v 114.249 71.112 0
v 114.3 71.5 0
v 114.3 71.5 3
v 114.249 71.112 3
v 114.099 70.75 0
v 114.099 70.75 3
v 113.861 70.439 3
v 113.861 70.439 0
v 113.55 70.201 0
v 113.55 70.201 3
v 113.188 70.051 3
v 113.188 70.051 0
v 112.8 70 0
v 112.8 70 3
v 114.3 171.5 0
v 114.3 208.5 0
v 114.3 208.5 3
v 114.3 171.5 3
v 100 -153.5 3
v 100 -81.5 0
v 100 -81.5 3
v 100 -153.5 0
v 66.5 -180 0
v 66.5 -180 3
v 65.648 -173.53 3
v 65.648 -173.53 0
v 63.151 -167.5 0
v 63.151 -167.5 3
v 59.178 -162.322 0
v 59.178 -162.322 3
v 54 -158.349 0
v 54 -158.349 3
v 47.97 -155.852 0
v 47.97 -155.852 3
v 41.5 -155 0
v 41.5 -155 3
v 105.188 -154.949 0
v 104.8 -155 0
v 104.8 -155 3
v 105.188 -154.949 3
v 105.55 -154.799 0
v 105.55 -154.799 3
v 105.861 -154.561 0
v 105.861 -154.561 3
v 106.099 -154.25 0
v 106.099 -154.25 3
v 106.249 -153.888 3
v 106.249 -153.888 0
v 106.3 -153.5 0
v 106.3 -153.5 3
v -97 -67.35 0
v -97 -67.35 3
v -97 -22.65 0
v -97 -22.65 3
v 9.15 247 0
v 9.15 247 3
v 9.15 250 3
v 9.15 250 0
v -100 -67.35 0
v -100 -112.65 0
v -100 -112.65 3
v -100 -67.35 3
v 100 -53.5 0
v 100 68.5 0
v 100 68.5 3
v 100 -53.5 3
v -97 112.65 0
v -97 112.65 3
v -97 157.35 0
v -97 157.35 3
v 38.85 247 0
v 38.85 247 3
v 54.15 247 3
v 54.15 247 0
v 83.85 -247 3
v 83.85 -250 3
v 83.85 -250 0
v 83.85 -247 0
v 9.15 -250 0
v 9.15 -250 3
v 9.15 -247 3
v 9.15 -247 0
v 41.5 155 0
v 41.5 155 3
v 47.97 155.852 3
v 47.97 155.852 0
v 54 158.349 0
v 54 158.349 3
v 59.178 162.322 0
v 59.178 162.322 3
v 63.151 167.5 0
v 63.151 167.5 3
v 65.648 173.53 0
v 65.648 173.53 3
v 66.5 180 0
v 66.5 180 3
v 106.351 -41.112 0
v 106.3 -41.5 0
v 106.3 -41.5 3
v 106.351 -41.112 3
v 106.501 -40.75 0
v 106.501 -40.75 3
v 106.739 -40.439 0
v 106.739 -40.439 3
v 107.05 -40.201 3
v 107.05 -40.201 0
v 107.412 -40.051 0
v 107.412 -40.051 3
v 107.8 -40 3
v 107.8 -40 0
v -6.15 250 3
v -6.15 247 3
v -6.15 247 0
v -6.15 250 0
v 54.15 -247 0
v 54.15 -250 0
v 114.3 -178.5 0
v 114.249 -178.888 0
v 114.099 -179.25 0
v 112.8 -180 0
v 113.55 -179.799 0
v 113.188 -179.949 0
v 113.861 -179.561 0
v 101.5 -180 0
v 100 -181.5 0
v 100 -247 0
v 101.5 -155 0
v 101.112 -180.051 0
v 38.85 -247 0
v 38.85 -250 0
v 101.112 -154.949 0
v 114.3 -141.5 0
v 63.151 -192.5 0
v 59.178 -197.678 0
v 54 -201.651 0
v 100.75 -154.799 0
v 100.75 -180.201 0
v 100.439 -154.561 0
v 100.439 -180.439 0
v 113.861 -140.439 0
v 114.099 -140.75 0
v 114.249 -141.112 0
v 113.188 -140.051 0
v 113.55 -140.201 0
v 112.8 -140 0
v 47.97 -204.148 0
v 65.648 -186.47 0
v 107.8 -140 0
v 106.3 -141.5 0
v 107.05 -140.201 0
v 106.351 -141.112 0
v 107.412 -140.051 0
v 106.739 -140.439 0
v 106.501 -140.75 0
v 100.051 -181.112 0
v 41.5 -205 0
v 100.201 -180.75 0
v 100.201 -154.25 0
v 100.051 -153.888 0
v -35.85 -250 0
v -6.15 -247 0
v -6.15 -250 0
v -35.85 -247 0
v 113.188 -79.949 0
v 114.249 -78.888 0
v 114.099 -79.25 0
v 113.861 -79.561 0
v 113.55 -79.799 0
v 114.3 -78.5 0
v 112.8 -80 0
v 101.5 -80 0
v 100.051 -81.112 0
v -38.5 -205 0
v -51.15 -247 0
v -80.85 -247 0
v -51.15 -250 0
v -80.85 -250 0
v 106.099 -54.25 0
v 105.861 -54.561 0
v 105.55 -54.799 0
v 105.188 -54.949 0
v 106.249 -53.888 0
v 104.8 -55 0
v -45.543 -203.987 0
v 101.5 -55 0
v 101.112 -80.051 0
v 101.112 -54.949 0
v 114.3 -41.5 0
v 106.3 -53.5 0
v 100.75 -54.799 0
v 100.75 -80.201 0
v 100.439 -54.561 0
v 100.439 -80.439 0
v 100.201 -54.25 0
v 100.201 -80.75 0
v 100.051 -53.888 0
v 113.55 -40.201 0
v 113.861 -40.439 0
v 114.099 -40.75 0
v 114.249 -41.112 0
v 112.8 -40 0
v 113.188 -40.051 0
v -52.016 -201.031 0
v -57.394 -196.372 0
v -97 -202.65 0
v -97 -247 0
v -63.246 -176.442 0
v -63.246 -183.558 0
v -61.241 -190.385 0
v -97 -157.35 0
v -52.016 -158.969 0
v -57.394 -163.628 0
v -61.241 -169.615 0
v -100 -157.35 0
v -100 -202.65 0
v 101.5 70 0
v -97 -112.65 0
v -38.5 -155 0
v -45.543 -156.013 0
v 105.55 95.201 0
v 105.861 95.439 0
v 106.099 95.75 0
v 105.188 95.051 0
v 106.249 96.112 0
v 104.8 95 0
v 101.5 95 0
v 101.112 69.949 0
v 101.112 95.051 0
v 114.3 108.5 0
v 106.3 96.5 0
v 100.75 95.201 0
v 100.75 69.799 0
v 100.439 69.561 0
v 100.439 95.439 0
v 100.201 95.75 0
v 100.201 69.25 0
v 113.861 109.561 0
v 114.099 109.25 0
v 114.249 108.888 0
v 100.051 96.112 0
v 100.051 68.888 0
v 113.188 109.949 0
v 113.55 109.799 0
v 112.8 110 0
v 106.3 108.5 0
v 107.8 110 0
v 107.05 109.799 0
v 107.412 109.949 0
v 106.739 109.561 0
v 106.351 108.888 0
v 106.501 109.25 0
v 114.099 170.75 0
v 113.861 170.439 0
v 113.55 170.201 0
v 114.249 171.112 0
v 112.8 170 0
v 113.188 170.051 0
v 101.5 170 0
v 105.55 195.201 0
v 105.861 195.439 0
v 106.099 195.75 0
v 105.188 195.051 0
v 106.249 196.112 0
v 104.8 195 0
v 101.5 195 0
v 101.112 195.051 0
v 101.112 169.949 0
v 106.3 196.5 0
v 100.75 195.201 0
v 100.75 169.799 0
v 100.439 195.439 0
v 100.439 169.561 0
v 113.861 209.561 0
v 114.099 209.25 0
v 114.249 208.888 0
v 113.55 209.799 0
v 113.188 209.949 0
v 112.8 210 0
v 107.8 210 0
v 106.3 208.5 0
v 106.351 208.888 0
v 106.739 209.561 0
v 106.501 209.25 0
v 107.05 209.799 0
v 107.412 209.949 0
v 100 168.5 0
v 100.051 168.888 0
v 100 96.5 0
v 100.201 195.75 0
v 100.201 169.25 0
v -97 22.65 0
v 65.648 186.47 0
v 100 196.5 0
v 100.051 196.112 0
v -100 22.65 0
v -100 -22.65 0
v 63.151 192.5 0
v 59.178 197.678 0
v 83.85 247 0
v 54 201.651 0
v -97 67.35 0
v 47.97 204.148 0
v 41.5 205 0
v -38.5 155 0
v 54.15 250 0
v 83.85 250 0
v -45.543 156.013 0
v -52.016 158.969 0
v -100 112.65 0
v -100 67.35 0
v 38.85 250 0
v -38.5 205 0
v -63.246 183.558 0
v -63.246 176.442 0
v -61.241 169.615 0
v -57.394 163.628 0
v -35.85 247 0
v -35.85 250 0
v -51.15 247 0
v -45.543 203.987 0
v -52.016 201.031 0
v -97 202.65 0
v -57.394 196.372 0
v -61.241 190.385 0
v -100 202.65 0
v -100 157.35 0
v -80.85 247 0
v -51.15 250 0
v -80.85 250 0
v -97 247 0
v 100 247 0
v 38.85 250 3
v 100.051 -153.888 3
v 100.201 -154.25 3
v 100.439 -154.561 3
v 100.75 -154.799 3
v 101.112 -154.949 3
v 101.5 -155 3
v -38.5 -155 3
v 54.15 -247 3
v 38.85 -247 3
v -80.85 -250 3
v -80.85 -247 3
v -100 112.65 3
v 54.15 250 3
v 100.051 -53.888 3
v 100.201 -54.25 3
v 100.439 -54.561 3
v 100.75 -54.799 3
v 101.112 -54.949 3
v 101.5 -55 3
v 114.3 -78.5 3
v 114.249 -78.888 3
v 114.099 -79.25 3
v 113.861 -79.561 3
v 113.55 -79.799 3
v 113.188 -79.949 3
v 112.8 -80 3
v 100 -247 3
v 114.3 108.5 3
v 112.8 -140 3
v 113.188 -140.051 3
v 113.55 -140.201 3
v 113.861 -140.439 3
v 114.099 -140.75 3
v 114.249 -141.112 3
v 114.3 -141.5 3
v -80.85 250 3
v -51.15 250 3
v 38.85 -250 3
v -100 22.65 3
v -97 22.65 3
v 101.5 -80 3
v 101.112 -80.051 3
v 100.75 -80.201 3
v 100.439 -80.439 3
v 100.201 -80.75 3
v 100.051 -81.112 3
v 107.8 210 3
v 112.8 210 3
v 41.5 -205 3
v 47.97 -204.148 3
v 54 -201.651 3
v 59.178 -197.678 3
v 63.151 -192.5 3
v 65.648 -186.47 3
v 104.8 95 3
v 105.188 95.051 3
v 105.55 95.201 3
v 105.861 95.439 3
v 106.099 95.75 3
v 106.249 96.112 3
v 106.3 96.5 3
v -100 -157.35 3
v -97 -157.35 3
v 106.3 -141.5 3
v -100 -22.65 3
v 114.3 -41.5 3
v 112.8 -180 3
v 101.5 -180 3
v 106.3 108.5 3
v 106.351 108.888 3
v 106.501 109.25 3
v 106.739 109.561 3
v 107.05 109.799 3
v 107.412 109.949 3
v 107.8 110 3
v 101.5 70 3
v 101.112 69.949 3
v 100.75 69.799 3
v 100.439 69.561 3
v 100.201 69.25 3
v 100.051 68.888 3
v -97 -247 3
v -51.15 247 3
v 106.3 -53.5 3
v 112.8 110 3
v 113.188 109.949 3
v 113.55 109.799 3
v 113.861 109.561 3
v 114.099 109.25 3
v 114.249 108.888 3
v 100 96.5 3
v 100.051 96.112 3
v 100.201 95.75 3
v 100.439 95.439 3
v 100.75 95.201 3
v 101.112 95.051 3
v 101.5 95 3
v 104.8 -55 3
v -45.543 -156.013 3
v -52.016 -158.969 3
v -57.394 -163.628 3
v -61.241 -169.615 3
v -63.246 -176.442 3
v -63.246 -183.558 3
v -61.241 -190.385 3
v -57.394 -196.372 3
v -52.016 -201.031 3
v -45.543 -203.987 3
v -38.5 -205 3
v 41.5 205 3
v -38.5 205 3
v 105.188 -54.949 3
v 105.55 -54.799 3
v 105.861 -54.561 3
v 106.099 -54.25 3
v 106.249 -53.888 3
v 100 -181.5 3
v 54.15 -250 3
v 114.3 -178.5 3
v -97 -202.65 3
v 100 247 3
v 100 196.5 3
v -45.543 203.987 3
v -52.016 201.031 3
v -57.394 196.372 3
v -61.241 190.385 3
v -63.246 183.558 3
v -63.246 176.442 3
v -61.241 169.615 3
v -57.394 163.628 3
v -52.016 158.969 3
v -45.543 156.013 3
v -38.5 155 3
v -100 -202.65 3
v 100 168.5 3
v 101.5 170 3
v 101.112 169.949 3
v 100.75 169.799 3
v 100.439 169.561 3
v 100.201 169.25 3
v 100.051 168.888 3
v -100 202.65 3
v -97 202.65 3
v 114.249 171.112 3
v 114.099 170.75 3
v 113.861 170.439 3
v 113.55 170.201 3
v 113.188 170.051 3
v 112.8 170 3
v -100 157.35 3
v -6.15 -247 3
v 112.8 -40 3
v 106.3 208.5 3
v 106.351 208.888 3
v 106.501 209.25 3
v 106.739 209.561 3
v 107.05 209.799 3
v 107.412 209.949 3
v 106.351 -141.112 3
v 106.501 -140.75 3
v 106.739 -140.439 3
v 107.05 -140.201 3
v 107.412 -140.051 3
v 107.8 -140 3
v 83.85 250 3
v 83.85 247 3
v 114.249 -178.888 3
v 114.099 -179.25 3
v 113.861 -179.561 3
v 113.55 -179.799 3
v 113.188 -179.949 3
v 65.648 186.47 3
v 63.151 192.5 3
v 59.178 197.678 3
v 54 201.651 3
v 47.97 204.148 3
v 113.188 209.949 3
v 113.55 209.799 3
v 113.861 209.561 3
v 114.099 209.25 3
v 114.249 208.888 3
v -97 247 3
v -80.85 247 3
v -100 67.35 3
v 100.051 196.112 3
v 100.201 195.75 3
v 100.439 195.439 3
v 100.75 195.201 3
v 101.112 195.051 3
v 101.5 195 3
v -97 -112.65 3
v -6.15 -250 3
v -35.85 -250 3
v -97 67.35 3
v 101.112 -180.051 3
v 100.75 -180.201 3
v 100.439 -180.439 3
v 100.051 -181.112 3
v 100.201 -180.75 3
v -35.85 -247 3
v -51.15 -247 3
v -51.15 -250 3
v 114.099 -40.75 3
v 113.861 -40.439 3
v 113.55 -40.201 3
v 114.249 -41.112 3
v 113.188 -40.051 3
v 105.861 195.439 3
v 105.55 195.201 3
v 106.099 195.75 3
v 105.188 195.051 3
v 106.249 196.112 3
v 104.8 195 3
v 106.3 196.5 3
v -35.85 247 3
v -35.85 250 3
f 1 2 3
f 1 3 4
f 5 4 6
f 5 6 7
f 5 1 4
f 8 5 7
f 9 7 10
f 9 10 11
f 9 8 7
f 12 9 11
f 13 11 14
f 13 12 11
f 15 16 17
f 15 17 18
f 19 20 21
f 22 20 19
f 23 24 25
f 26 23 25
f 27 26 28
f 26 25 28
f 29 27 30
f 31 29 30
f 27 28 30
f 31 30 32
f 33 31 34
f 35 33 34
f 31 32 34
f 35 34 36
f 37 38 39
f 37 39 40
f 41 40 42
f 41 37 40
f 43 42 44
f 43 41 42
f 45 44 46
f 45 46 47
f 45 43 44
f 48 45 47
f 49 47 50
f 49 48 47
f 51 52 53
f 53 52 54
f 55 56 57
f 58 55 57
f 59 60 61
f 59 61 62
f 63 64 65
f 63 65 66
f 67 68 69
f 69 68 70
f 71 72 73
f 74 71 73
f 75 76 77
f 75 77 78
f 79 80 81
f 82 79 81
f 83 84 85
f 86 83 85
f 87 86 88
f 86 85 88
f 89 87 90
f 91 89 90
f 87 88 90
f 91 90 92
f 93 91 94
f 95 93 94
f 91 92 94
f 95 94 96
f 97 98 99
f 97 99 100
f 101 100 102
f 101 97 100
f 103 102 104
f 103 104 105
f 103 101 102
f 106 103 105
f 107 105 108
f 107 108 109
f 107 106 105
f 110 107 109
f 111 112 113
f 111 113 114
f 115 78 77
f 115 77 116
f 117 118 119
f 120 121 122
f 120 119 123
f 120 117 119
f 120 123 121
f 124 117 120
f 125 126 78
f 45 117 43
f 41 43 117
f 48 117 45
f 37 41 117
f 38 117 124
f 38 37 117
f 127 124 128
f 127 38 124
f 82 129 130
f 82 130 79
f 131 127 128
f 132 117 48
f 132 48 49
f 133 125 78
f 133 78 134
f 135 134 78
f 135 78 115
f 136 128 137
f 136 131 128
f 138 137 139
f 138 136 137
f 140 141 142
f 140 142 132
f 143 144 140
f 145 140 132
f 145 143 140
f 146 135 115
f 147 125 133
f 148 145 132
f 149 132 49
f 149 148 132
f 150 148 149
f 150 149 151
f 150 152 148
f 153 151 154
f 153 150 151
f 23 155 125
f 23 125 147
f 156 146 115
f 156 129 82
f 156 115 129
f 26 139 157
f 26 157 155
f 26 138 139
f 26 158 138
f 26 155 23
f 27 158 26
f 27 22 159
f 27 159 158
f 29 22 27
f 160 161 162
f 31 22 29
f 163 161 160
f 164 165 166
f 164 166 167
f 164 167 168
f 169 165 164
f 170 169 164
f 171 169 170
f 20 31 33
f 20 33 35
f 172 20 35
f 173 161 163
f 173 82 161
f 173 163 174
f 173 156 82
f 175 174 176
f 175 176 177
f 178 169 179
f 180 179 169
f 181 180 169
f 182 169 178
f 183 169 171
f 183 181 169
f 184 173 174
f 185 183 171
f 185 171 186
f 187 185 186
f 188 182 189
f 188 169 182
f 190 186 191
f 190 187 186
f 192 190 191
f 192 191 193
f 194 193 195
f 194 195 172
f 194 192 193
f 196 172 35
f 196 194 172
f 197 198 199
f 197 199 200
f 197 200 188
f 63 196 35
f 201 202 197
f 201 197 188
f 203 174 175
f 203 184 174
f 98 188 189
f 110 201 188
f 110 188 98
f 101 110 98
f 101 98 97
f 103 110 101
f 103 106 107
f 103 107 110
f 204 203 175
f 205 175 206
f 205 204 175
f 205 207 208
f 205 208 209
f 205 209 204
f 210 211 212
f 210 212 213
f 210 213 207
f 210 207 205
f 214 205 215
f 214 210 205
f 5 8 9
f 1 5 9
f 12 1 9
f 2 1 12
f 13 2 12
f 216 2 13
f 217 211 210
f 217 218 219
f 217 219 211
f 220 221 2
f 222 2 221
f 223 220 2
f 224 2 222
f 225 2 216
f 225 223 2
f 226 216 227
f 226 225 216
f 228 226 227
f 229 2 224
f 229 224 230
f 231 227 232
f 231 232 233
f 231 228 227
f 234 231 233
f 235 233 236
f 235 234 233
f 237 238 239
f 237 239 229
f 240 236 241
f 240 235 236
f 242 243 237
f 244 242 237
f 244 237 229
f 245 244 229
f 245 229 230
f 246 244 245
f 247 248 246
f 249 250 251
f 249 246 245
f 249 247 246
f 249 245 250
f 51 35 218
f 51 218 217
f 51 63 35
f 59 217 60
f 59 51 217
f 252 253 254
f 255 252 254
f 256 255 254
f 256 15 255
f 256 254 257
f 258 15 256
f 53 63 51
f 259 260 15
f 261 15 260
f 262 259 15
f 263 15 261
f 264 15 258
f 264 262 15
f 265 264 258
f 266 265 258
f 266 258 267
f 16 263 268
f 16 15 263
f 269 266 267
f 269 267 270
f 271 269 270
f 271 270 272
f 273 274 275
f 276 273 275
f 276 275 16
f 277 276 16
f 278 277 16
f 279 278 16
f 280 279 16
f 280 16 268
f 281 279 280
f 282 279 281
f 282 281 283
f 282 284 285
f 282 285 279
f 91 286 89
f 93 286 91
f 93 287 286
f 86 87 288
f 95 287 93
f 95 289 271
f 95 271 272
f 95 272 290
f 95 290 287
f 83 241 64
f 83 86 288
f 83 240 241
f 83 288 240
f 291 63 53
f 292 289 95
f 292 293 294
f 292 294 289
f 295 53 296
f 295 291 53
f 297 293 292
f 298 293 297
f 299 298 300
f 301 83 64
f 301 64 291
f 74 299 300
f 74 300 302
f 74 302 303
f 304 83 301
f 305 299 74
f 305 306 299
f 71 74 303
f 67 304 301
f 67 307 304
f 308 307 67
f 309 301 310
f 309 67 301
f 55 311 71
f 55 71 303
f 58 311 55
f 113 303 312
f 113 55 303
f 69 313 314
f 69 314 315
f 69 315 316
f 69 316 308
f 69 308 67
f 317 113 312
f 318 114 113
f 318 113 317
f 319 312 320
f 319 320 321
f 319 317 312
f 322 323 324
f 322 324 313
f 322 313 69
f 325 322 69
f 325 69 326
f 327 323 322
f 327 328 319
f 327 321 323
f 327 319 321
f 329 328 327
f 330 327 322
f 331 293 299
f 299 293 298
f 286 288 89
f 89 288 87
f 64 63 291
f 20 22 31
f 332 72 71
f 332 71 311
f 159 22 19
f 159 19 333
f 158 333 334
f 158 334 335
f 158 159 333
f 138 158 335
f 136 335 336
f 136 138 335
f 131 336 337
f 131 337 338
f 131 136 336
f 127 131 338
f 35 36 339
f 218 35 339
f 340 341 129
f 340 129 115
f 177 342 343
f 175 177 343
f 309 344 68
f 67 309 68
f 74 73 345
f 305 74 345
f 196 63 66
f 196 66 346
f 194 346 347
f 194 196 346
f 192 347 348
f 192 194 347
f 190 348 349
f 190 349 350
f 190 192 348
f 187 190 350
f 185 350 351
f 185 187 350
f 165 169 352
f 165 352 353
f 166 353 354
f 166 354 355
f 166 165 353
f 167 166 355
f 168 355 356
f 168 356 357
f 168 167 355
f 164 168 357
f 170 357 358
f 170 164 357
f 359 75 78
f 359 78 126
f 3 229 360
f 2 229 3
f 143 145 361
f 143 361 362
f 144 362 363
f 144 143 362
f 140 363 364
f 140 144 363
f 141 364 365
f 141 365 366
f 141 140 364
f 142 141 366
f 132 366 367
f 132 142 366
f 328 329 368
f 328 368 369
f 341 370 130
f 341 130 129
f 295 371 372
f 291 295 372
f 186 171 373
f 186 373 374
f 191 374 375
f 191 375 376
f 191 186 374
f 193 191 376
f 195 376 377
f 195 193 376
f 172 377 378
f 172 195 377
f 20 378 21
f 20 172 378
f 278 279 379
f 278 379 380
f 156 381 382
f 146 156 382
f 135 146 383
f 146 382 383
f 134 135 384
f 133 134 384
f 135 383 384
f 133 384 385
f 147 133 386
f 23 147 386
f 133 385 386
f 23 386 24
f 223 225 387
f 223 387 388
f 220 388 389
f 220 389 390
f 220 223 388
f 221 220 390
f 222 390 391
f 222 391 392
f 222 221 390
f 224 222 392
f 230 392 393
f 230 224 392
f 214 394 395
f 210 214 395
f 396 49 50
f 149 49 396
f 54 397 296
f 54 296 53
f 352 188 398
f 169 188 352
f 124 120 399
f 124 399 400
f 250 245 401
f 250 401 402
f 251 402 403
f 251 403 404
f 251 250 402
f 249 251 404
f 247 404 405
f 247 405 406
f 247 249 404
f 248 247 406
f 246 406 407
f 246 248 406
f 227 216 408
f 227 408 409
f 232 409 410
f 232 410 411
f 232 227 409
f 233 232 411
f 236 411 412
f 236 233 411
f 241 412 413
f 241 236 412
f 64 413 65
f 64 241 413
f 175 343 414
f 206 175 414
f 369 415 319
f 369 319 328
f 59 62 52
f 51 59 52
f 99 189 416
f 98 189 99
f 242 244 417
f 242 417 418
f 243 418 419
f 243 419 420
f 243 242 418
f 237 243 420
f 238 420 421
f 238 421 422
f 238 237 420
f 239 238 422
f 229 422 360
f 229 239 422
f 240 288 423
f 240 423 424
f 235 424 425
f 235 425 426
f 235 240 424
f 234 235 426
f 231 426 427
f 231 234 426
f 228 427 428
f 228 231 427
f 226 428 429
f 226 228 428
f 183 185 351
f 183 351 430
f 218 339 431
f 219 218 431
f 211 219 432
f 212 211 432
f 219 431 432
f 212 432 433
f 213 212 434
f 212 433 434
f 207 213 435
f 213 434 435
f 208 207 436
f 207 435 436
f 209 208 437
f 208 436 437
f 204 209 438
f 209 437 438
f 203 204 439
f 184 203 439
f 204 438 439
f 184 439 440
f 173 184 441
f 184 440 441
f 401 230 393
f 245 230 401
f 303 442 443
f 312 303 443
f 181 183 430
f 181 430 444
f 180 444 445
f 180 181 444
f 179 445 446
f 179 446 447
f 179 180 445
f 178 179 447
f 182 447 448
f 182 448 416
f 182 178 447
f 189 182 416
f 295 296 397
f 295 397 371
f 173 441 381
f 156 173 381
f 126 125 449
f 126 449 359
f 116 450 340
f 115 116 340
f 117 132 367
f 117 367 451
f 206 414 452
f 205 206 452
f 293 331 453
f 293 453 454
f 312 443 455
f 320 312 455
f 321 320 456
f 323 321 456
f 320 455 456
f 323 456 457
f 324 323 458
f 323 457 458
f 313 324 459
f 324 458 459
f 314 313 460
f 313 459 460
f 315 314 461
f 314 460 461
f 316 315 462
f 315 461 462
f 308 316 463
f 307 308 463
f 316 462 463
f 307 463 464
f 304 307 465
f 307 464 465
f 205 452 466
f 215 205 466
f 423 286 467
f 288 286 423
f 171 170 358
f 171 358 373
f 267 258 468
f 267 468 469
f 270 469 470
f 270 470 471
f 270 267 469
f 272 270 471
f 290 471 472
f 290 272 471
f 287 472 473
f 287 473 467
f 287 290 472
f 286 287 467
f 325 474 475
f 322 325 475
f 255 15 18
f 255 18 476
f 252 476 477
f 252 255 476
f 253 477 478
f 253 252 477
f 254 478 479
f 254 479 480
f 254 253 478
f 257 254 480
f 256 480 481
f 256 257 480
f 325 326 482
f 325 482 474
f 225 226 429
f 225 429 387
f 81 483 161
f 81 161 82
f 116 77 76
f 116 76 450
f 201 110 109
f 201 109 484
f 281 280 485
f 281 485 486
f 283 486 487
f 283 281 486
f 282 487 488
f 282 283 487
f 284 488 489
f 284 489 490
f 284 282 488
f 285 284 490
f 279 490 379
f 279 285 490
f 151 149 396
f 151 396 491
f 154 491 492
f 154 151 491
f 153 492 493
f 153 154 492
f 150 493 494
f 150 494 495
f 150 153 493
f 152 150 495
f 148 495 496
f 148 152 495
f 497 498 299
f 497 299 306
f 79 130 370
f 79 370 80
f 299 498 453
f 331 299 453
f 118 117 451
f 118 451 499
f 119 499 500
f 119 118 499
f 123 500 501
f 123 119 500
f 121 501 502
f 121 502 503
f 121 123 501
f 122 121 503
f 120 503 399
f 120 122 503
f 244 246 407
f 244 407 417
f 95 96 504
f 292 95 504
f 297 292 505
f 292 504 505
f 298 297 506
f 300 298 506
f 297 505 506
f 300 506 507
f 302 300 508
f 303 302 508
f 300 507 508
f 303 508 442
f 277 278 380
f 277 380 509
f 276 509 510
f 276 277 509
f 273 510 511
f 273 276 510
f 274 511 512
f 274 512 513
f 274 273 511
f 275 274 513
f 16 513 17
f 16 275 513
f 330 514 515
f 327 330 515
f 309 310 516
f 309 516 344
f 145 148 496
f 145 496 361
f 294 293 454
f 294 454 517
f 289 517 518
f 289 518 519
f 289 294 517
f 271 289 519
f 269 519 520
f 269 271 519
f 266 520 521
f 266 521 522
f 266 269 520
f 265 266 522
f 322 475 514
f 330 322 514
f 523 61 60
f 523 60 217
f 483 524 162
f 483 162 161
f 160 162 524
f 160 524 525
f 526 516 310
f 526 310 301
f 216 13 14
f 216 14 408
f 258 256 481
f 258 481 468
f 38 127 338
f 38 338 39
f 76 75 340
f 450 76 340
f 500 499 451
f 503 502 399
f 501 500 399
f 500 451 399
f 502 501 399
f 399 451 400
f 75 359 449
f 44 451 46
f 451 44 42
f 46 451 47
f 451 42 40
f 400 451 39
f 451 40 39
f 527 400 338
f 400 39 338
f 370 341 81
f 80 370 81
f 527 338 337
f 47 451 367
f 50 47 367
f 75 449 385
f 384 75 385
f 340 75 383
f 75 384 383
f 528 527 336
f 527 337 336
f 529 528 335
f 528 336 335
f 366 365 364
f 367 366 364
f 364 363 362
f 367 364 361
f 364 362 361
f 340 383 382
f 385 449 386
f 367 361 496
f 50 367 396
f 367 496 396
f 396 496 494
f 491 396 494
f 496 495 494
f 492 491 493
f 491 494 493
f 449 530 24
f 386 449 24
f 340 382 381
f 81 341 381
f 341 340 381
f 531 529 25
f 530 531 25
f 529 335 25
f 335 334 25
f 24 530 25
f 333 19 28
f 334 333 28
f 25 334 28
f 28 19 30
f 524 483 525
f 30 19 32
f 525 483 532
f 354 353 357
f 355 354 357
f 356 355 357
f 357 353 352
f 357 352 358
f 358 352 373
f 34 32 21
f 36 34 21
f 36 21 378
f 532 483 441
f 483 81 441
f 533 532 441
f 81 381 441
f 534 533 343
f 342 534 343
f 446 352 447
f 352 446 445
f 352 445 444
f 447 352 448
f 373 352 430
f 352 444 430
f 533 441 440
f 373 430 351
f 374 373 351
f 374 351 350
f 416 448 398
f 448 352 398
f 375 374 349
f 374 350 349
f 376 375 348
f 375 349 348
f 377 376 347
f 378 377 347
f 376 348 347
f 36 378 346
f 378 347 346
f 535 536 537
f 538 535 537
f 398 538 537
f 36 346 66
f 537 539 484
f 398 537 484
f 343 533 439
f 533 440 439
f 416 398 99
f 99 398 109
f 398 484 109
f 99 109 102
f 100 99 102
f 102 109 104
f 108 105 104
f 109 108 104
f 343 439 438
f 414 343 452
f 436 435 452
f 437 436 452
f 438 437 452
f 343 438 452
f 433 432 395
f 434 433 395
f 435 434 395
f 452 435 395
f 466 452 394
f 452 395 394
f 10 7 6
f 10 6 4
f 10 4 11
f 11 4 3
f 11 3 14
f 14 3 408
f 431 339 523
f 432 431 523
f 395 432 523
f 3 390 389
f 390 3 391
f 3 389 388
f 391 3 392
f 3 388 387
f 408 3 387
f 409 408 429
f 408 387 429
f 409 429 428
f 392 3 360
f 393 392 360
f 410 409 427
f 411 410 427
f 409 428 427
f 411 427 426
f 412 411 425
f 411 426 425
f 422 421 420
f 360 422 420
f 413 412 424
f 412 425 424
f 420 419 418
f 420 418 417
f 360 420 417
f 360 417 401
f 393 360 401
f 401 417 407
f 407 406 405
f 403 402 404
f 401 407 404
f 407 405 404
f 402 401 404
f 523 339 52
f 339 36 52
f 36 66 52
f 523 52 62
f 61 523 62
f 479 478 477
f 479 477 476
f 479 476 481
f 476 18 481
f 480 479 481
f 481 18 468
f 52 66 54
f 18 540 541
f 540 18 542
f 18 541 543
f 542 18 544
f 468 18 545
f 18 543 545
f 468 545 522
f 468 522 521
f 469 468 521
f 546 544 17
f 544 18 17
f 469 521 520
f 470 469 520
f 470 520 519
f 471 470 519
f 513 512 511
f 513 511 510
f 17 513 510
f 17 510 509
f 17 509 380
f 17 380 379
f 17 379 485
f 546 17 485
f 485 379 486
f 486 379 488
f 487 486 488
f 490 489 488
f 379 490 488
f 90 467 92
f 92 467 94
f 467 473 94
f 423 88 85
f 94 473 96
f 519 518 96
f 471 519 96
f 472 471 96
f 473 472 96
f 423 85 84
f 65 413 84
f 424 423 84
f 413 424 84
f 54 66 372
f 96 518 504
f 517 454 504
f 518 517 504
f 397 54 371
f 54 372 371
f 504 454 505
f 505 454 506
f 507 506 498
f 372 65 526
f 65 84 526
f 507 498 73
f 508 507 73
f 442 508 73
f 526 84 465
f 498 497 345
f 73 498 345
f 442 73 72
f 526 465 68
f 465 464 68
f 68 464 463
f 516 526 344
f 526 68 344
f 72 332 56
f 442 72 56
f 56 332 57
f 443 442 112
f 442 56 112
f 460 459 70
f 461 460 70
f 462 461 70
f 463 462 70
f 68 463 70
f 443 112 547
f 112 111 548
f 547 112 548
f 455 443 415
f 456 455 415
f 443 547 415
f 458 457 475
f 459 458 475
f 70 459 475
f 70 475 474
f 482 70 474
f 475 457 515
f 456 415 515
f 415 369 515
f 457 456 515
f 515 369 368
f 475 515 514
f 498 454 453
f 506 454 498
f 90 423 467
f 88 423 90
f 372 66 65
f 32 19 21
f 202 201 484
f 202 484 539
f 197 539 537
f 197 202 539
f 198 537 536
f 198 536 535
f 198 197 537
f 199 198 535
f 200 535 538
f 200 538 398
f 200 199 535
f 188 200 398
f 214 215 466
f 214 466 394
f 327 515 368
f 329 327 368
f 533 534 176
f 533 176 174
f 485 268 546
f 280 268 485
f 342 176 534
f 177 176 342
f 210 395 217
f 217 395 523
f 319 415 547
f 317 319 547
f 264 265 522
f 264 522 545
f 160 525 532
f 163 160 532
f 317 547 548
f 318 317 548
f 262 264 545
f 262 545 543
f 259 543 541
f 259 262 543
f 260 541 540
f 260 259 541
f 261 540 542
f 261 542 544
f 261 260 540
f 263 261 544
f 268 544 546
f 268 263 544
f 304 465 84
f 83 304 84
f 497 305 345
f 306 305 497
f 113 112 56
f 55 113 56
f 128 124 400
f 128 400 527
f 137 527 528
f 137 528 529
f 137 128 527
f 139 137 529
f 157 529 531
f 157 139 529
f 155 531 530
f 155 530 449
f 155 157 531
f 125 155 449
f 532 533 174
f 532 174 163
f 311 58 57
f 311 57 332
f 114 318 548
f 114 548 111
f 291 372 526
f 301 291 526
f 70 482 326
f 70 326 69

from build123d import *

# Parameters (mm, degrees)
SALIENTE_EXTRUIR1_DEPTH = 3
CORTAR_EXTRUIR1_REACH   = 5
CROQUIS2_W              = 15.3
CROQUIS2_H              = 3
CROQUIS2_W_2            = 16.15
CROQUIS2_W_3            = 3
CROQUIS2_H_2            = 44.7


with BuildPart() as part:
    # Croquis1 → Saliente-Extruir1 (new body)
    with BuildSketch(Plane.XY):
        with BuildLine():
            Line((101.5, 195), (104.8, 195))
            ThreePointArc((104.8, 195), (105.860660172, 195.439339828), (106.3, 196.5))
            Line((106.3, 196.5), (106.3, 208.5))
            ThreePointArc((106.3, 208.5), (106.739339828, 209.560660172), (107.8, 210))
            Line((107.8, 210), (112.8, 210))
            ThreePointArc((112.8, 210), (113.860660172, 209.560660172), (114.3, 208.5))
            Line((114.3, 208.5), (114.3, 171.5))
            ThreePointArc((114.3, 171.5), (113.860660172, 170.439339828), (112.8, 170))
            Line((112.8, 170), (101.5, 170))
            ThreePointArc((101.5, 170), (100.439339828, 169.560660172), (100, 168.5))
            Line((100, 168.5), (100, 96.5))
            ThreePointArc((100, 96.5), (100.439339828, 95.439339828), (101.5, 95))
            Line((101.5, 95), (104.8, 95))
            ThreePointArc((104.8, 95), (105.860660172, 95.439339828), (106.3, 96.5))
            Line((106.3, 96.5), (106.3, 108.5))
            ThreePointArc((106.3, 108.5), (106.739339828, 109.560660172), (107.8, 110))
            Line((107.8, 110), (112.8, 110))
            ThreePointArc((112.8, 110), (113.860660172, 109.560660172), (114.3, 108.5))
            Line((114.3, 108.5), (114.3, 71.5))
            ThreePointArc((114.3, 71.5), (113.860660172, 70.439339828), (112.8, 70))
            Line((112.8, 70), (101.5, 70))
            ThreePointArc((101.5, 70), (100.439339828, 69.560660172), (100, 68.5))
            Line((100, 68.5), (100, -53.5))
            ThreePointArc((100, -53.5), (100.439339828, -54.560660172), (101.5, -55))
            Line((101.5, -55), (104.8, -55))
            ThreePointArc((104.8, -55), (105.860660172, -54.560660172), (106.3, -53.5))
            Line((106.3, -53.5), (106.3, -41.5))
            ThreePointArc((106.3, -41.5), (106.739339828, -40.439339828), (107.8, -40))
            Line((107.8, -40), (112.8, -40))
            ThreePointArc((112.8, -40), (113.860660172, -40.439339828), (114.3, -41.5))
            Line((114.3, -41.5), (114.3, -78.5))
            ThreePointArc((114.3, -78.5), (113.860660172, -79.560660172), (112.8, -80))
            Line((112.8, -80), (101.5, -80))
            ThreePointArc((101.5, -80), (100.439339828, -80.439339828), (100, -81.5))
            Line((100, -81.5), (100, -153.5))
            ThreePointArc((100, -153.5), (100.439339828, -154.560660172), (101.5, -155))
            Line((101.5, -155), (104.8, -155))
            ThreePointArc((104.8, -155), (105.860660172, -154.560660172), (106.3, -153.5))
            Line((106.3, -153.5), (106.3, -141.5))
            ThreePointArc((106.3, -141.5), (106.739339828, -140.439339828), (107.8, -140))
            Line((107.8, -140), (112.8, -140))
            ThreePointArc((112.8, -140), (113.860660172, -140.439339828), (114.3, -141.5))
            Line((114.3, -141.5), (114.3, -178.5))
            ThreePointArc((114.3, -178.5), (113.860660172, -179.560660172), (112.8, -180))
            Line((112.8, -180), (101.5, -180))
            ThreePointArc((101.5, -180), (100.439339828, -180.439339828), (100, -181.5))
            Line((100, -181.5), (100, -250))
            Line((100, -250), (-100, -250))
            Line((-100, -250), (-100, 250))
            Line((-100, 250), (100, 250))
            Line((100, 250), (100, 196.5))
            ThreePointArc((100, 196.5), (100.439339828, 195.439339828), (101.5, 195))
        make_face()
    extrude(amount=SALIENTE_EXTRUIR1_DEPTH)

    # Croquis2 → Cortar-Extruir1 (cut, up to next)
    with BuildSketch(Plane.XY.offset(3), mode=Mode.PRIVATE) as cortar_extruir1_sk1:
        Polygon((-100, -250), (-80.85, -250), (-80.85, -247), (-97, -247), (-97, -202.65), (-100, -202.65), align=None)
    cortar_extruir1_tool1 = extrude(cortar_extruir1_sk1.sketch, amount=-CORTAR_EXTRUIR1_REACH, mode=Mode.PRIVATE) & part.part
    add(cortar_extruir1_tool1.solids().sort_by_distance((-99.489241, -226.325, 3))[0], mode=Mode.SUBTRACT)
    # Croquis2 → Cortar-Extruir1 (cut, up to next)
    with BuildSketch(Plane.XY.offset(3), mode=Mode.PRIVATE) as cortar_extruir1_sk2:
        with Locations((-43.5, -248.5)):
            Rectangle(CROQUIS2_W, CROQUIS2_H)
    cortar_extruir1_tool2 = extrude(cortar_extruir1_sk2.sketch, amount=-CORTAR_EXTRUIR1_REACH, mode=Mode.PRIVATE) & part.part
    add(cortar_extruir1_tool2.solids().sort_by_distance((-43.5, -248.5, 3))[0], mode=Mode.SUBTRACT)
    # Croquis2 → Cortar-Extruir1 (cut, up to next)
    with BuildSketch(Plane.XY.offset(3), mode=Mode.PRIVATE) as cortar_extruir1_sk3:
        with Locations((1.5, -248.5)):
            Rectangle(CROQUIS2_W, CROQUIS2_H)
    cortar_extruir1_tool3 = extrude(cortar_extruir1_sk3.sketch, amount=-CORTAR_EXTRUIR1_REACH, mode=Mode.PRIVATE) & part.part
    add(cortar_extruir1_tool3.solids().sort_by_distance((1.5, -248.5, 3))[0], mode=Mode.SUBTRACT)
    # Croquis2 → Cortar-Extruir1 (cut, up to next)
    with BuildSketch(Plane.XY.offset(3), mode=Mode.PRIVATE) as cortar_extruir1_sk4:
        with Locations((46.5, -248.5)):
            Rectangle(CROQUIS2_W, CROQUIS2_H)
    cortar_extruir1_tool4 = extrude(cortar_extruir1_sk4.sketch, amount=-CORTAR_EXTRUIR1_REACH, mode=Mode.PRIVATE) & part.part
    add(cortar_extruir1_tool4.solids().sort_by_distance((46.5, -248.5, 3))[0], mode=Mode.SUBTRACT)
    # Croquis2 → Cortar-Extruir1 (cut, up to next)
    with BuildSketch(Plane.XY.offset(3), mode=Mode.PRIVATE) as cortar_extruir1_sk5:
        with Locations((91.925, -248.5)):
            Rectangle(CROQUIS2_W_2, CROQUIS2_H)
    cortar_extruir1_tool5 = extrude(cortar_extruir1_sk5.sketch, amount=-CORTAR_EXTRUIR1_REACH, mode=Mode.PRIVATE) & part.part
    add(cortar_extruir1_tool5.solids().sort_by_distance((91.925, -248.5, 3))[0], mode=Mode.SUBTRACT)
    # Croquis2 → Cortar-Extruir1 (cut, up to next)
    with BuildSketch(Plane.XY.offset(3), mode=Mode.PRIVATE) as cortar_extruir1_sk6:
        with Locations((-98.5, -135)):
            Rectangle(CROQUIS2_W_3, CROQUIS2_H_2)
    cortar_extruir1_tool6 = extrude(cortar_extruir1_sk6.sketch, amount=-CORTAR_EXTRUIR1_REACH, mode=Mode.PRIVATE) & part.part
    add(cortar_extruir1_tool6.solids().sort_by_distance((-98.5, -135, 3))[0], mode=Mode.SUBTRACT)
    # Croquis2 → Cortar-Extruir1 (cut, up to next)
    with BuildSketch(Plane.XY.offset(3), mode=Mode.PRIVATE) as cortar_extruir1_sk7:
        with Locations((-98.5, -45)):
            Rectangle(CROQUIS2_W_3, CROQUIS2_H_2)
    cortar_extruir1_tool7 = extrude(cortar_extruir1_sk7.sketch, amount=-CORTAR_EXTRUIR1_REACH, mode=Mode.PRIVATE) & part.part
    add(cortar_extruir1_tool7.solids().sort_by_distance((-98.5, -45, 3))[0], mode=Mode.SUBTRACT)
    # Croquis2 → Cortar-Extruir1 (cut, up to next)
    with BuildSketch(Plane.XY.offset(3), mode=Mode.PRIVATE) as cortar_extruir1_sk8:
        with Locations((-98.5, 45)):
            Rectangle(CROQUIS2_W_3, CROQUIS2_H_2)
    cortar_extruir1_tool8 = extrude(cortar_extruir1_sk8.sketch, amount=-CORTAR_EXTRUIR1_REACH, mode=Mode.PRIVATE) & part.part
    add(cortar_extruir1_tool8.solids().sort_by_distance((-98.5, 45, 3))[0], mode=Mode.SUBTRACT)
    # Croquis2 → Cortar-Extruir1 (cut, up to next)
    with BuildSketch(Plane.XY.offset(3), mode=Mode.PRIVATE) as cortar_extruir1_sk9:
        with Locations((-98.5, 135)):
            Rectangle(CROQUIS2_W_3, CROQUIS2_H_2)
    cortar_extruir1_tool9 = extrude(cortar_extruir1_sk9.sketch, amount=-CORTAR_EXTRUIR1_REACH, mode=Mode.PRIVATE) & part.part
    add(cortar_extruir1_tool9.solids().sort_by_distance((-98.5, 135, 3))[0], mode=Mode.SUBTRACT)
    # Croquis2 → Cortar-Extruir1 (cut, up to next)
    with BuildSketch(Plane.XY.offset(3), mode=Mode.PRIVATE) as cortar_extruir1_sk10:
        Polygon((-80.85, 247), (-80.85, 250), (-100, 250), (-100, 202.65), (-97, 202.65), (-97, 247), align=None)
    cortar_extruir1_tool10 = extrude(cortar_extruir1_sk10.sketch, amount=-CORTAR_EXTRUIR1_REACH, mode=Mode.PRIVATE) & part.part
    add(cortar_extruir1_tool10.solids().sort_by_distance((-81.360759, 248.5, 3))[0], mode=Mode.SUBTRACT)
    # Croquis2 → Cortar-Extruir1 (cut, up to next)
    with BuildSketch(Plane.XY.offset(3), mode=Mode.PRIVATE) as cortar_extruir1_sk11:
        with Locations((-43.5, 248.5)):
            Rectangle(CROQUIS2_W, CROQUIS2_H)
    cortar_extruir1_tool11 = extrude(cortar_extruir1_sk11.sketch, amount=-CORTAR_EXTRUIR1_REACH, mode=Mode.PRIVATE) & part.part
    add(cortar_extruir1_tool11.solids().sort_by_distance((-43.5, 248.5, 3))[0], mode=Mode.SUBTRACT)
    # Croquis2 → Cortar-Extruir1 (cut, up to next)
    with BuildSketch(Plane.XY.offset(3), mode=Mode.PRIVATE) as cortar_extruir1_sk12:
        with BuildLine():
            ThreePointArc((41.5, 155), (59.17766953, 162.32233047), (66.5, 180))
            ThreePointArc((66.5, 180), (59.17766953, 197.67766953), (41.5, 205))
            Line((41.5, 205), (-38.5, 205))
            ThreePointArc((-38.5, 205), (-63.5, 180), (-38.5, 155))
            Line((-38.5, 155), (41.5, 155))
        make_face()
    cortar_extruir1_tool12 = extrude(cortar_extruir1_sk12.sketch, amount=-CORTAR_EXTRUIR1_REACH, mode=Mode.PRIVATE) & part.part
    add(cortar_extruir1_tool12.solids().sort_by_distance((1.5, 180, 3))[0], mode=Mode.SUBTRACT)
    # Croquis2 → Cortar-Extruir1 (cut, up to next)
    with BuildSketch(Plane.XY.offset(3), mode=Mode.PRIVATE) as cortar_extruir1_sk13:
        with Locations((46.5, 248.5)):
            Rectangle(CROQUIS2_W, CROQUIS2_H)
    cortar_extruir1_tool13 = extrude(cortar_extruir1_sk13.sketch, amount=-CORTAR_EXTRUIR1_REACH, mode=Mode.PRIVATE) & part.part
    add(cortar_extruir1_tool13.solids().sort_by_distance((46.5, 248.5, 3))[0], mode=Mode.SUBTRACT)
    # Croquis2 → Cortar-Extruir1 (cut, up to next)
    with BuildSketch(Plane.XY.offset(3), mode=Mode.PRIVATE) as cortar_extruir1_sk14:
        with Locations((1.5, 248.5)):
            Rectangle(CROQUIS2_W, CROQUIS2_H)
    cortar_extruir1_tool14 = extrude(cortar_extruir1_sk14.sketch, amount=-CORTAR_EXTRUIR1_REACH, mode=Mode.PRIVATE) & part.part
    add(cortar_extruir1_tool14.solids().sort_by_distance((1.5, 248.5, 3))[0], mode=Mode.SUBTRACT)
    # Croquis2 → Cortar-Extruir1 (cut, up to next)
    with BuildSketch(Plane.XY.offset(3), mode=Mode.PRIVATE) as cortar_extruir1_sk15:
        with Locations((91.925, 248.5)):
            Rectangle(CROQUIS2_W_2, CROQUIS2_H)
    cortar_extruir1_tool15 = extrude(cortar_extruir1_sk15.sketch, amount=-CORTAR_EXTRUIR1_REACH, mode=Mode.PRIVATE) & part.part
    add(cortar_extruir1_tool15.solids().sort_by_distance((91.925, 248.5, 3))[0], mode=Mode.SUBTRACT)
    # Croquis2 → Cortar-Extruir1 (cut, up to next)
    with BuildSketch(Plane.XY.offset(3), mode=Mode.PRIVATE) as cortar_extruir1_sk16:
        with BuildLine():
            ThreePointArc((41.5, -205), (59.17766953, -197.67766953), (66.5, -180))
            ThreePointArc((66.5, -180), (59.17766953, -162.32233047), (41.5, -155))
            Line((41.5, -155), (-38.5, -155))
            ThreePointArc((-38.5, -155), (-63.5, -180), (-38.5, -205))
            Line((-38.5, -205), (41.5, -205))
        make_face()
    cortar_extruir1_tool16 = extrude(cortar_extruir1_sk16.sketch, amount=-CORTAR_EXTRUIR1_REACH, mode=Mode.PRIVATE) & part.part
    add(cortar_extruir1_tool16.solids().sort_by_distance((1.5, -180, 3))[0], mode=Mode.SUBTRACT)


solid = part.part
